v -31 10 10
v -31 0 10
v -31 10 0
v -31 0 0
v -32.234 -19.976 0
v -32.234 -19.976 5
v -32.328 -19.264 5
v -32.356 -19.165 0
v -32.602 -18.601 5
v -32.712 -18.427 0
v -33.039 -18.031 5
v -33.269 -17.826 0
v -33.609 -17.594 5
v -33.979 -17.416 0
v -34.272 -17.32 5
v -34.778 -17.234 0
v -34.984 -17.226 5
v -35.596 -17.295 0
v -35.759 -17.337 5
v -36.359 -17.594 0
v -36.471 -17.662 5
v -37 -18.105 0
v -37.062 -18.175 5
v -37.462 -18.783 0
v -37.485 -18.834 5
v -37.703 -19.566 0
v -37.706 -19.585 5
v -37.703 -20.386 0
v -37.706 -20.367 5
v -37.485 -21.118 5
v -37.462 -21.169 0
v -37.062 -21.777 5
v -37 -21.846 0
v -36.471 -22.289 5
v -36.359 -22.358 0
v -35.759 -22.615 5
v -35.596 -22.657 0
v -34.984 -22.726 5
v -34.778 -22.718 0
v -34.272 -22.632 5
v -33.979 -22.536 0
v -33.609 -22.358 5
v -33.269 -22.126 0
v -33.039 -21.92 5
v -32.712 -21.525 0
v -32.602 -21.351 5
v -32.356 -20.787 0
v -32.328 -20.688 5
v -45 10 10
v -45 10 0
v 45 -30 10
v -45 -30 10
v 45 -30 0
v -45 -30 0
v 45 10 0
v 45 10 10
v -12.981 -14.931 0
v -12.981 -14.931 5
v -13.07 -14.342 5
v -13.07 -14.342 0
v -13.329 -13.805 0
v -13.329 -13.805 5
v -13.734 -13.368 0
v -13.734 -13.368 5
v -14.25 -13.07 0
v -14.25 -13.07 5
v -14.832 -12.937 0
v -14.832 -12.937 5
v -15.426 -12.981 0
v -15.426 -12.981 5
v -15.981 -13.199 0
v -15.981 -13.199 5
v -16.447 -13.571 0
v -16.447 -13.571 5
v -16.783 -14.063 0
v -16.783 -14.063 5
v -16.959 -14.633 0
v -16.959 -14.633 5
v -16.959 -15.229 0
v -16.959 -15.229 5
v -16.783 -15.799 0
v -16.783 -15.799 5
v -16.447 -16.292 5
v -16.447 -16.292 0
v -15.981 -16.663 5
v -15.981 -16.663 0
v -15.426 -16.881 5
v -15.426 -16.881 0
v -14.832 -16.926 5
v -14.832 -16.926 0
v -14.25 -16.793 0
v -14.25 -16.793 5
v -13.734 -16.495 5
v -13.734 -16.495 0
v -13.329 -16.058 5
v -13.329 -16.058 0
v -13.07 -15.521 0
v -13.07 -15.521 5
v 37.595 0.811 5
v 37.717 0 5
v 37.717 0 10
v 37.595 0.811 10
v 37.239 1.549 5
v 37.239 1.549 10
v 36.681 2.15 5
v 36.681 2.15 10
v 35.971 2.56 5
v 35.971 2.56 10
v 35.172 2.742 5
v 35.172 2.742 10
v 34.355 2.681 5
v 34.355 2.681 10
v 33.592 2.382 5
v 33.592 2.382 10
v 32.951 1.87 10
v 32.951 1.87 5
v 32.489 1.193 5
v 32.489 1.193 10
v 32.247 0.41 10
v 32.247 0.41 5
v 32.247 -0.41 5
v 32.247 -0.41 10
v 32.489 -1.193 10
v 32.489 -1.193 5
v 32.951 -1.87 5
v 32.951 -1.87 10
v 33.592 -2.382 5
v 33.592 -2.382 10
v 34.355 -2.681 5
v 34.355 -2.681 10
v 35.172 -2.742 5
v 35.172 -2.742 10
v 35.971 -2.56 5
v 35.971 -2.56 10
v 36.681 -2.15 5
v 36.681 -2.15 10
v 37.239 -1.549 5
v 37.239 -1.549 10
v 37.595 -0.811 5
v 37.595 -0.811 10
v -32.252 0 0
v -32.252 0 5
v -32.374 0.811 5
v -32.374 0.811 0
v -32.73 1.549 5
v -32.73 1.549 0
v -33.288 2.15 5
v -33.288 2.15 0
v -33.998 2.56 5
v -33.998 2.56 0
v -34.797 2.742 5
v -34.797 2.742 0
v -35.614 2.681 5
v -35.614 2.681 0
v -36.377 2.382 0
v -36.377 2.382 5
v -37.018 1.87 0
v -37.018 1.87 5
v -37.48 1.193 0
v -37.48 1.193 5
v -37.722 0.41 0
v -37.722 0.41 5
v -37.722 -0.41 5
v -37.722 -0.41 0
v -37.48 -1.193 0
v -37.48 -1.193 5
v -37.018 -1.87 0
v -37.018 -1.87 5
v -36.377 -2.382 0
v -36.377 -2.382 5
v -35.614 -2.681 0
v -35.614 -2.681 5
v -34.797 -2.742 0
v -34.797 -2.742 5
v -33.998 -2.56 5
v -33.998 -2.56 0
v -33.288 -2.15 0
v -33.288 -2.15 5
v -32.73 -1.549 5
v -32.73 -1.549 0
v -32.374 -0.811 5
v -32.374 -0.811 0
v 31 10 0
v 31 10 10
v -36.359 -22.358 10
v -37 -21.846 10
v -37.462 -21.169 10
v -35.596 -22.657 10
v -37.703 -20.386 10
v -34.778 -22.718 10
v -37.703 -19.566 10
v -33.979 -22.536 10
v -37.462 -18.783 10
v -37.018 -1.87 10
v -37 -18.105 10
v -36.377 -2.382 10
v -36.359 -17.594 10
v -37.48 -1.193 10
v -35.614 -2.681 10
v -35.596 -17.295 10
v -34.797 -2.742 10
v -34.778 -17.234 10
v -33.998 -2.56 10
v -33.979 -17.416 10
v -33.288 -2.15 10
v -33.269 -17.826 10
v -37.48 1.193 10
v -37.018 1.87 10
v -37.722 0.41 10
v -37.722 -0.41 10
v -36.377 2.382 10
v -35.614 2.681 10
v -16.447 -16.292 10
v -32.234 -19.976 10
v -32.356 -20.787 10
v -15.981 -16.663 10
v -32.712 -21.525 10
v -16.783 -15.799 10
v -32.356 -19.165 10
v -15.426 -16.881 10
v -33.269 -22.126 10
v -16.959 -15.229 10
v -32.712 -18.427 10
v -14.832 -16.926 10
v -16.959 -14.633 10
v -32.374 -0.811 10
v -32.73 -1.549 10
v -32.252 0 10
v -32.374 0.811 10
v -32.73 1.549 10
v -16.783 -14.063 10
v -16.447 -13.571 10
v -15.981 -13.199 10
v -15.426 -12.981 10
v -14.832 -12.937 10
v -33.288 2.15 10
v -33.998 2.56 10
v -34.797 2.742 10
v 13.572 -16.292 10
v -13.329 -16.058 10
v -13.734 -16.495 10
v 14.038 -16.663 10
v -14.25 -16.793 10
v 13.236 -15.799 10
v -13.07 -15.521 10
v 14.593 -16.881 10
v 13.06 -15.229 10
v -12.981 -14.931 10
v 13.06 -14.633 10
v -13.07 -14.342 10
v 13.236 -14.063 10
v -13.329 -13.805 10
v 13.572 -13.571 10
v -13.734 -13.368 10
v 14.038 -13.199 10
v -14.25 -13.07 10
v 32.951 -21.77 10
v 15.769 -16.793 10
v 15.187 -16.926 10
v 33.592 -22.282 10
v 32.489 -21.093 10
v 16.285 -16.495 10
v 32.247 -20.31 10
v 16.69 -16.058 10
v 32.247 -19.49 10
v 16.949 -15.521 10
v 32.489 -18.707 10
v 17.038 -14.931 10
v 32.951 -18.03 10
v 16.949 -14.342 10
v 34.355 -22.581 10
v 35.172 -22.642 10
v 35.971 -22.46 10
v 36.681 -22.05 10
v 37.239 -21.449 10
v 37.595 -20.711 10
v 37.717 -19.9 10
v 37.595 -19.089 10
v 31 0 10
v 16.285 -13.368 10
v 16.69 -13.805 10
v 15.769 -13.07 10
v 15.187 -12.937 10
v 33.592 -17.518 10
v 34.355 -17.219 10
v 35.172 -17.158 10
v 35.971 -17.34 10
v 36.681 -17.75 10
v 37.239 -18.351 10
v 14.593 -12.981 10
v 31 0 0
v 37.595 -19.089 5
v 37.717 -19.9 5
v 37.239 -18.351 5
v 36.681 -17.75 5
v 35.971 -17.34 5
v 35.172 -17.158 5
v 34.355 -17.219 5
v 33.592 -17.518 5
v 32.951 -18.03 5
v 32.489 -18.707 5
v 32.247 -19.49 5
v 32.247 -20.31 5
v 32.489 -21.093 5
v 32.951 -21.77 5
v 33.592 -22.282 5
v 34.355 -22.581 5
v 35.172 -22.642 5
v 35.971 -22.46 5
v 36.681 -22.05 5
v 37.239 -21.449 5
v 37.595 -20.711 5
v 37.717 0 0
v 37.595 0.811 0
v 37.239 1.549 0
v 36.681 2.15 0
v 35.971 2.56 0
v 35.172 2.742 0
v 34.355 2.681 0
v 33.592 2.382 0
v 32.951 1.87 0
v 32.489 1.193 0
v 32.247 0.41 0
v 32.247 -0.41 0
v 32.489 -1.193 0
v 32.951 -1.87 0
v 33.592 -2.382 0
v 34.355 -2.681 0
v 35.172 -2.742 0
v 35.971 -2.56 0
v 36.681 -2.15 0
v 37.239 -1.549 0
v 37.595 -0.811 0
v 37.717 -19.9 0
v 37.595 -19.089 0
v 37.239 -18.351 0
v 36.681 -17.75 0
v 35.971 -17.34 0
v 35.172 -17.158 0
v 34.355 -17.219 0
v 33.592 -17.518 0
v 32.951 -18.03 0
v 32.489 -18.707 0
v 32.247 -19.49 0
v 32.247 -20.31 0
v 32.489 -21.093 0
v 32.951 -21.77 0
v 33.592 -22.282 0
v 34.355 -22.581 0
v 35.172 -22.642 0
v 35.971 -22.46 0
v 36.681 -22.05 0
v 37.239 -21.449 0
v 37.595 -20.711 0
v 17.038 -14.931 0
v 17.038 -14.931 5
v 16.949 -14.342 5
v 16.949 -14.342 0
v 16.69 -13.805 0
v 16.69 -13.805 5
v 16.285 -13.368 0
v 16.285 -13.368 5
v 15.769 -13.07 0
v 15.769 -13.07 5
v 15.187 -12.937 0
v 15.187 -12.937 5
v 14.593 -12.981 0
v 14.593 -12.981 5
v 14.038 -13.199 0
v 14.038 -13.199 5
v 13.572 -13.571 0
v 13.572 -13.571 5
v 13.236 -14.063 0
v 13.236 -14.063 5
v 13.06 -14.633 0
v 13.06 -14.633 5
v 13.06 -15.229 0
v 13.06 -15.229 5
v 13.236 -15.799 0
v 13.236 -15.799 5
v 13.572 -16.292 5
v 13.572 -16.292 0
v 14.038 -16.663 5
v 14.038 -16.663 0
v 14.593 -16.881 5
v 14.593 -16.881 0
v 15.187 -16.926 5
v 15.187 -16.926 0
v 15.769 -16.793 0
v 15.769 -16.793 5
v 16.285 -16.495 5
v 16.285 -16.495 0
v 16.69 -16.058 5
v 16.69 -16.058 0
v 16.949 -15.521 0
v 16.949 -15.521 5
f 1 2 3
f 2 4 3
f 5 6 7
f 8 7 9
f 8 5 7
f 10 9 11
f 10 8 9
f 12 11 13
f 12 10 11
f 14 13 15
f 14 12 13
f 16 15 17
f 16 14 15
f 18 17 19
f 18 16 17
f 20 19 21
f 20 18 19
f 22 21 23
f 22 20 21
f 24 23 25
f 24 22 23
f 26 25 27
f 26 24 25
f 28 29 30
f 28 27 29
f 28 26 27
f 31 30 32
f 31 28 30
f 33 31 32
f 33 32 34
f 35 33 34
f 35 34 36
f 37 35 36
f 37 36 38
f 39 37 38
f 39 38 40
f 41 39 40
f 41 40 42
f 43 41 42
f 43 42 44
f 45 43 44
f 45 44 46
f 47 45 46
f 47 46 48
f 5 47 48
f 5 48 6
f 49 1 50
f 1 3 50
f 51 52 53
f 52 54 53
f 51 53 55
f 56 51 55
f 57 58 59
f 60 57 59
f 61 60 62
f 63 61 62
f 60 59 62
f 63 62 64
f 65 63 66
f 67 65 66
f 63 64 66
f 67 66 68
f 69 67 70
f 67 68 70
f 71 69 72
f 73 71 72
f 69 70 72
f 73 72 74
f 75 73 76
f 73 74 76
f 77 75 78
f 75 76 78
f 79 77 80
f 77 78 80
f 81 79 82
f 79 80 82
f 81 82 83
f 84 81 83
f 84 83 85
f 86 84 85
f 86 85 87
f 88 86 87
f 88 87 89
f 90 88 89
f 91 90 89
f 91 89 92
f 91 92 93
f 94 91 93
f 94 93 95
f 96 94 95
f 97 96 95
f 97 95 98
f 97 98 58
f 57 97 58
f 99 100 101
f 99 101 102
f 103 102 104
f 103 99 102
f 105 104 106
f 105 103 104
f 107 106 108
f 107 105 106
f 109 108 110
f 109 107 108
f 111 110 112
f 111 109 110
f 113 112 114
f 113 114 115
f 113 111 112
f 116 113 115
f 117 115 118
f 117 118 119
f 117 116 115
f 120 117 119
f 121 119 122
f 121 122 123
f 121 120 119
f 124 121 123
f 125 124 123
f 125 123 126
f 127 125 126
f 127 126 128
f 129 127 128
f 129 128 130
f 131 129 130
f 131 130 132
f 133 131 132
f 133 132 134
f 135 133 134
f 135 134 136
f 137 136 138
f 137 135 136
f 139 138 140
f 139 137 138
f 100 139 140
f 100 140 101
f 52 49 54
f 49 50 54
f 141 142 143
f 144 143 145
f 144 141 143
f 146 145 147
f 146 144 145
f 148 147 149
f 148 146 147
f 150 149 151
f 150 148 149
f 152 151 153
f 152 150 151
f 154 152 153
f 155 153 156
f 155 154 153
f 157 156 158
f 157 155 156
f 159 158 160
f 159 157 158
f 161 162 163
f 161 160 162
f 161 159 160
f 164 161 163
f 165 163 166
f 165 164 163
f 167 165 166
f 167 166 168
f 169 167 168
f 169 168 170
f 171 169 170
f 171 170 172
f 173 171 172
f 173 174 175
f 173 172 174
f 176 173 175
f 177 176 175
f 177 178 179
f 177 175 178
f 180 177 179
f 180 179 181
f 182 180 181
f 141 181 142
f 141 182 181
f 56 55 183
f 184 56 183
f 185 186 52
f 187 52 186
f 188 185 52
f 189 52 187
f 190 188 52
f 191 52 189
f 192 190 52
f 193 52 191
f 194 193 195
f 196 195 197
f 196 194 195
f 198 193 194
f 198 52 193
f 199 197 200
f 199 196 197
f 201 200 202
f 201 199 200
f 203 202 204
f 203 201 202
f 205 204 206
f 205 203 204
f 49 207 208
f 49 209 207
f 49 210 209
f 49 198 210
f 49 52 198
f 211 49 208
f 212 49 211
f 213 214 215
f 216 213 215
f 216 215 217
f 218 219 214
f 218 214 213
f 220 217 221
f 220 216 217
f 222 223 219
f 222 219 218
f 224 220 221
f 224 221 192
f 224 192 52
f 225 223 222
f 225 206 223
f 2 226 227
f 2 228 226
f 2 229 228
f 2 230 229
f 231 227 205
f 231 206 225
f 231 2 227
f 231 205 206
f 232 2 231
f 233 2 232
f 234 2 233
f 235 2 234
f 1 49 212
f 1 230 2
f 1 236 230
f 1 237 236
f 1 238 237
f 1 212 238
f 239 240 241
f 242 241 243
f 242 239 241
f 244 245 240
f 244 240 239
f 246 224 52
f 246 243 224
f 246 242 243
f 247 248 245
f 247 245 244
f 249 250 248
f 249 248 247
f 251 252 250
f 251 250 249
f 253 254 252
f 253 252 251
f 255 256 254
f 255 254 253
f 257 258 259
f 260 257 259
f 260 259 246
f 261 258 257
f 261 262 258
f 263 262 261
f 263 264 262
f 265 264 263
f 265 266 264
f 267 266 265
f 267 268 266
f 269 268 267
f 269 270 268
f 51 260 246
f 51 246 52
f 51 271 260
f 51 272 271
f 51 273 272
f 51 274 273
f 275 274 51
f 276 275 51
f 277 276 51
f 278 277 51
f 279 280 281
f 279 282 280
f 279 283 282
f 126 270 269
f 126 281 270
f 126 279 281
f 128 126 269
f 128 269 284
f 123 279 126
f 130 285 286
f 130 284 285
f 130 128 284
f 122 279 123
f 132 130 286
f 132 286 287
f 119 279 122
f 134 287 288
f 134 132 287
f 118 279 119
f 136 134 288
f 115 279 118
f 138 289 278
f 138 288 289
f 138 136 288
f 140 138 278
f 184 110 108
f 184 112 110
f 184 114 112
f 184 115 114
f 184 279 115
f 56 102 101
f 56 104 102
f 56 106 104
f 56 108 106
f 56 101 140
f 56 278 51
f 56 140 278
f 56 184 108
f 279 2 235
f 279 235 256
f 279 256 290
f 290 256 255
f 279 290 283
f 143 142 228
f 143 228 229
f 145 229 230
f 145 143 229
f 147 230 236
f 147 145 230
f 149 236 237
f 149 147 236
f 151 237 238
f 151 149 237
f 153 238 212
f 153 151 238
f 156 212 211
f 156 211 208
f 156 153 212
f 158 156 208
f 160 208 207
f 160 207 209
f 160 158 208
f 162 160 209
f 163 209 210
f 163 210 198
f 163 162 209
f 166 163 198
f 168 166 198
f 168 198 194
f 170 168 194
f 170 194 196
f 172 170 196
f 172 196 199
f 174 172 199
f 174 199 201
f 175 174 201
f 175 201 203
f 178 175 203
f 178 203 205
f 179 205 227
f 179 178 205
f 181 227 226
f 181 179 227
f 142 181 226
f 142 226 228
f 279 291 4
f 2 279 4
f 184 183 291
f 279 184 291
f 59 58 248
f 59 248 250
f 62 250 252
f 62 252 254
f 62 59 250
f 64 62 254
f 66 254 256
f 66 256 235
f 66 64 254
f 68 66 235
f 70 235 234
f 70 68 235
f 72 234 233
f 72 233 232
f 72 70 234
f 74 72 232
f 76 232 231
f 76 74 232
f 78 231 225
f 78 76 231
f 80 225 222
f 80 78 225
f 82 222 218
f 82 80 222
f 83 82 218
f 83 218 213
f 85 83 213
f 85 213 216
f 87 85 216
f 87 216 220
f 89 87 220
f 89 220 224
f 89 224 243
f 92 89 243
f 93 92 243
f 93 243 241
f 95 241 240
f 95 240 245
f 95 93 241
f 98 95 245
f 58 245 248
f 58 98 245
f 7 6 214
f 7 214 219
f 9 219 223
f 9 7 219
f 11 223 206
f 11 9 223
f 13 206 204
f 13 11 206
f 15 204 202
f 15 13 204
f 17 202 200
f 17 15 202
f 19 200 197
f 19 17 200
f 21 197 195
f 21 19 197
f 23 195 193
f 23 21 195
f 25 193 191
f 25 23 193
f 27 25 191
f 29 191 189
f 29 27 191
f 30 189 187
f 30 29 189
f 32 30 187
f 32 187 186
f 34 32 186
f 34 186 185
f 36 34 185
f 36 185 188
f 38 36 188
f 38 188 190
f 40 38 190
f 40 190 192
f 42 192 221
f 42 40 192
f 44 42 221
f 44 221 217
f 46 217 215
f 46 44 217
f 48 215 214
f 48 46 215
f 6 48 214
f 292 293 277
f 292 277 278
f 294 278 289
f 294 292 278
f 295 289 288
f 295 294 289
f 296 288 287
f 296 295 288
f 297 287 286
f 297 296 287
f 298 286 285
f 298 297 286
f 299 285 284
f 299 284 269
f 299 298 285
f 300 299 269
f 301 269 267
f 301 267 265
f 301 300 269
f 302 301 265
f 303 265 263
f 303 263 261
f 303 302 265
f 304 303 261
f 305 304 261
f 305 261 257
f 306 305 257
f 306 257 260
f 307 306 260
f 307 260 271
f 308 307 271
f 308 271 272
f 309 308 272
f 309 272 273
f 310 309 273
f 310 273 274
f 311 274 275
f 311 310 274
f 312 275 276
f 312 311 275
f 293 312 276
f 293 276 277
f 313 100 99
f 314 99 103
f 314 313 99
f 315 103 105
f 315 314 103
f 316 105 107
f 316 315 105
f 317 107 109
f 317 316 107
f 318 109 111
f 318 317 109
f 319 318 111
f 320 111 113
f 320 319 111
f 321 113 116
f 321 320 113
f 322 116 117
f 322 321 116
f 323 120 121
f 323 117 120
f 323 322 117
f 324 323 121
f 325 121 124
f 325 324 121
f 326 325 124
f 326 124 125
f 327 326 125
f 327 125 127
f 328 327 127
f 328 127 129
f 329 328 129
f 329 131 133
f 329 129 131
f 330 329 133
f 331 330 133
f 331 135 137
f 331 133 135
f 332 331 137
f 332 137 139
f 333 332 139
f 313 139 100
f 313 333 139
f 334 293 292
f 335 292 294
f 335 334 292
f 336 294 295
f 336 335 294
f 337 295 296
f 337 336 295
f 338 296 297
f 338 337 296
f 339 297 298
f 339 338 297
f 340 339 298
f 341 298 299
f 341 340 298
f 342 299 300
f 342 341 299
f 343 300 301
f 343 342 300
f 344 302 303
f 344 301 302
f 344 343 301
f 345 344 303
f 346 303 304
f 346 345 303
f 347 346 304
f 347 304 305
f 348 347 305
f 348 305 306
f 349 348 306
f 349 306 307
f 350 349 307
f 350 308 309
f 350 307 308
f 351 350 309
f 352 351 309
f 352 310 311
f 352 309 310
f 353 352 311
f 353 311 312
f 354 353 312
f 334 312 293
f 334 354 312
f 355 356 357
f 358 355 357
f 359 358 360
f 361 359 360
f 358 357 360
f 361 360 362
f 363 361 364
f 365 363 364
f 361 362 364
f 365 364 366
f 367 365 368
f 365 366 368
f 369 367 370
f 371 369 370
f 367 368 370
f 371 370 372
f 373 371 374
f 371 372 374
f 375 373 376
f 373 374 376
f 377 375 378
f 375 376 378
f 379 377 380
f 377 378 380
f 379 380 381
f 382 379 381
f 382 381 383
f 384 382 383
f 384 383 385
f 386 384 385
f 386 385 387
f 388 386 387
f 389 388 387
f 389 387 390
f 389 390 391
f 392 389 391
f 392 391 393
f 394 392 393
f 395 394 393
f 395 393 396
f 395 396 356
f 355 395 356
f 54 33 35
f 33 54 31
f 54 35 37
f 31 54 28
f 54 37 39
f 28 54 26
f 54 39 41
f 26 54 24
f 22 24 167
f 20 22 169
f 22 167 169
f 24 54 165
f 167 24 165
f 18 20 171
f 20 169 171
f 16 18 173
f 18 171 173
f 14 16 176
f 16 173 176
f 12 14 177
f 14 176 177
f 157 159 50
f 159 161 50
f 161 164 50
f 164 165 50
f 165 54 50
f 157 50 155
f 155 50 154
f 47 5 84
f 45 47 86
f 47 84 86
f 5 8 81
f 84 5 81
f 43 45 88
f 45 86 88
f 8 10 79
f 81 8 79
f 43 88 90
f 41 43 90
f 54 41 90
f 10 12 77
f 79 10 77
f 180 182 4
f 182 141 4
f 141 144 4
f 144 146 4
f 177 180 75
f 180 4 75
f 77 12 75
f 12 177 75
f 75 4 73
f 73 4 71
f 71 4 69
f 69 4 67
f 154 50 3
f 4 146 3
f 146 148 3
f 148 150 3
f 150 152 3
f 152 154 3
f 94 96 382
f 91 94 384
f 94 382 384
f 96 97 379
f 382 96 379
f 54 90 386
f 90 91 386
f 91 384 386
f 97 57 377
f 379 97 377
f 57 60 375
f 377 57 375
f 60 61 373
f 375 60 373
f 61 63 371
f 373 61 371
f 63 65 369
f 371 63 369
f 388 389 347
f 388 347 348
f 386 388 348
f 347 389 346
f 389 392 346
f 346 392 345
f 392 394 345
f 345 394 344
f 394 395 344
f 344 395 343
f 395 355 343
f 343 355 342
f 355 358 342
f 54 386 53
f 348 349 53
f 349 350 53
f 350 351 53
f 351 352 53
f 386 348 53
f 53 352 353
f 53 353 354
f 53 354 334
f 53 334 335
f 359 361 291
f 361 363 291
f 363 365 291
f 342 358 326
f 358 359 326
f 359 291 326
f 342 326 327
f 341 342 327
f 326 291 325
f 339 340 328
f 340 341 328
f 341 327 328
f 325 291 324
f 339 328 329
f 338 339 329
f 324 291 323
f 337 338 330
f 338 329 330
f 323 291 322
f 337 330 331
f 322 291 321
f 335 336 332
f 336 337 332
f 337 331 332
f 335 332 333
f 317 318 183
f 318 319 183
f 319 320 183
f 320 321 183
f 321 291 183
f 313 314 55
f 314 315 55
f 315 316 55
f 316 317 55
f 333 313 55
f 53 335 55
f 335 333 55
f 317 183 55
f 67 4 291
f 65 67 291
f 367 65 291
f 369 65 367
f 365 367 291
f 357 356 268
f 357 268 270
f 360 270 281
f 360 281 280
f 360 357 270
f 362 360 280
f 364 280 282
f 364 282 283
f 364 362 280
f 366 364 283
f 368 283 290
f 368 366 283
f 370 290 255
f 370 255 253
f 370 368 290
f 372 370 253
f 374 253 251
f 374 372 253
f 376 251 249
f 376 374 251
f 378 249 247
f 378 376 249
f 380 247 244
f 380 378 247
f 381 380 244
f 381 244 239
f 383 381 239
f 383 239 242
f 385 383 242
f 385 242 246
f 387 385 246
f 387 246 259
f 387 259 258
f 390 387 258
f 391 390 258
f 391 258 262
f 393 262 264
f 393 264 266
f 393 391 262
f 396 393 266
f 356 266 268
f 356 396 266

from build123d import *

# Parameters (mm, degrees)
F1_DEPTH    = 5
F2_R        = 2.75
F3_DEPTH    = 58.2
F4_R        = 2
F5_DEPTH    = 25
F1_FACE_R   = 2.75
F1_FACE_R_2 = 2
F6_DEPTH    = 5


with BuildPart() as f1:
    # F0 (on Top) → F1 (new body)
    with BuildSketch(Plane.XY):
        Polygon((31, 0), (0, 0), (-31, 0), (-31, 10), (-45, 10), (-45, -30), (45, -30), (45, 10), (31, 10), align=None)
    extrude(amount=F1_DEPTH)

    # F2 (on Top) → F3 (cut)
    with BuildSketch(Plane.XY):
        with Locations((-34.98394, -19.975932)):
            Circle(F2_R)
        with Locations((-35.002254, 0)):
            Circle(F2_R)
        with Locations((34.966677, 0)):
            Circle(F2_R)
        with Locations((34.966677, -19.899994)):
            Circle(F2_R)
    extrude(amount=F3_DEPTH, mode=Mode.SUBTRACT)

    # F4 (on face) → F5 (cut)
    with BuildSketch(Plane.XY.offset(5)):
        with Locations((-14.981076, -14.93126)):
            Circle(F4_R)
        with Locations((15.037959, -14.93126)):
            Circle(F4_R)
    extrude(amount=-F5_DEPTH, mode=Mode.SUBTRACT)

    # F1_face (on face) → F6 (join)
    with BuildSketch(Plane(origin=(0.000435, -13.224629, 5), x_dir=(1, 0, 0), z_dir=(0, 0, 1))):
        Polygon((30.999565, 13.224629), (-31.000435, 13.224629), (-31.000435, 23.224629), (-45.000435, 23.224629), (-45.000435, -16.775371), (44.999565, -16.775371), (44.999565, 23.224629), (30.999565, 23.224629), align=None)
        with Locations((-34.984376, -6.751303)):
            Circle(F1_FACE_R, mode=Mode.SUBTRACT)
        with Locations((-14.981511, -1.706631)):
            Circle(F1_FACE_R_2, mode=Mode.SUBTRACT)
        with Locations((34.966242, -6.675365)):
            Circle(F1_FACE_R, mode=Mode.SUBTRACT)
        with Locations((15.037524, -1.706631)):
            Circle(F1_FACE_R_2, mode=Mode.SUBTRACT)
        with Locations((-35.002689, 13.224629)):
            Circle(F1_FACE_R, mode=Mode.SUBTRACT)
        with Locations((34.966242, 13.224629)):
            Circle(F1_FACE_R, mode=Mode.SUBTRACT)
    extrude(amount=F6_DEPTH)


solid = f1.part
